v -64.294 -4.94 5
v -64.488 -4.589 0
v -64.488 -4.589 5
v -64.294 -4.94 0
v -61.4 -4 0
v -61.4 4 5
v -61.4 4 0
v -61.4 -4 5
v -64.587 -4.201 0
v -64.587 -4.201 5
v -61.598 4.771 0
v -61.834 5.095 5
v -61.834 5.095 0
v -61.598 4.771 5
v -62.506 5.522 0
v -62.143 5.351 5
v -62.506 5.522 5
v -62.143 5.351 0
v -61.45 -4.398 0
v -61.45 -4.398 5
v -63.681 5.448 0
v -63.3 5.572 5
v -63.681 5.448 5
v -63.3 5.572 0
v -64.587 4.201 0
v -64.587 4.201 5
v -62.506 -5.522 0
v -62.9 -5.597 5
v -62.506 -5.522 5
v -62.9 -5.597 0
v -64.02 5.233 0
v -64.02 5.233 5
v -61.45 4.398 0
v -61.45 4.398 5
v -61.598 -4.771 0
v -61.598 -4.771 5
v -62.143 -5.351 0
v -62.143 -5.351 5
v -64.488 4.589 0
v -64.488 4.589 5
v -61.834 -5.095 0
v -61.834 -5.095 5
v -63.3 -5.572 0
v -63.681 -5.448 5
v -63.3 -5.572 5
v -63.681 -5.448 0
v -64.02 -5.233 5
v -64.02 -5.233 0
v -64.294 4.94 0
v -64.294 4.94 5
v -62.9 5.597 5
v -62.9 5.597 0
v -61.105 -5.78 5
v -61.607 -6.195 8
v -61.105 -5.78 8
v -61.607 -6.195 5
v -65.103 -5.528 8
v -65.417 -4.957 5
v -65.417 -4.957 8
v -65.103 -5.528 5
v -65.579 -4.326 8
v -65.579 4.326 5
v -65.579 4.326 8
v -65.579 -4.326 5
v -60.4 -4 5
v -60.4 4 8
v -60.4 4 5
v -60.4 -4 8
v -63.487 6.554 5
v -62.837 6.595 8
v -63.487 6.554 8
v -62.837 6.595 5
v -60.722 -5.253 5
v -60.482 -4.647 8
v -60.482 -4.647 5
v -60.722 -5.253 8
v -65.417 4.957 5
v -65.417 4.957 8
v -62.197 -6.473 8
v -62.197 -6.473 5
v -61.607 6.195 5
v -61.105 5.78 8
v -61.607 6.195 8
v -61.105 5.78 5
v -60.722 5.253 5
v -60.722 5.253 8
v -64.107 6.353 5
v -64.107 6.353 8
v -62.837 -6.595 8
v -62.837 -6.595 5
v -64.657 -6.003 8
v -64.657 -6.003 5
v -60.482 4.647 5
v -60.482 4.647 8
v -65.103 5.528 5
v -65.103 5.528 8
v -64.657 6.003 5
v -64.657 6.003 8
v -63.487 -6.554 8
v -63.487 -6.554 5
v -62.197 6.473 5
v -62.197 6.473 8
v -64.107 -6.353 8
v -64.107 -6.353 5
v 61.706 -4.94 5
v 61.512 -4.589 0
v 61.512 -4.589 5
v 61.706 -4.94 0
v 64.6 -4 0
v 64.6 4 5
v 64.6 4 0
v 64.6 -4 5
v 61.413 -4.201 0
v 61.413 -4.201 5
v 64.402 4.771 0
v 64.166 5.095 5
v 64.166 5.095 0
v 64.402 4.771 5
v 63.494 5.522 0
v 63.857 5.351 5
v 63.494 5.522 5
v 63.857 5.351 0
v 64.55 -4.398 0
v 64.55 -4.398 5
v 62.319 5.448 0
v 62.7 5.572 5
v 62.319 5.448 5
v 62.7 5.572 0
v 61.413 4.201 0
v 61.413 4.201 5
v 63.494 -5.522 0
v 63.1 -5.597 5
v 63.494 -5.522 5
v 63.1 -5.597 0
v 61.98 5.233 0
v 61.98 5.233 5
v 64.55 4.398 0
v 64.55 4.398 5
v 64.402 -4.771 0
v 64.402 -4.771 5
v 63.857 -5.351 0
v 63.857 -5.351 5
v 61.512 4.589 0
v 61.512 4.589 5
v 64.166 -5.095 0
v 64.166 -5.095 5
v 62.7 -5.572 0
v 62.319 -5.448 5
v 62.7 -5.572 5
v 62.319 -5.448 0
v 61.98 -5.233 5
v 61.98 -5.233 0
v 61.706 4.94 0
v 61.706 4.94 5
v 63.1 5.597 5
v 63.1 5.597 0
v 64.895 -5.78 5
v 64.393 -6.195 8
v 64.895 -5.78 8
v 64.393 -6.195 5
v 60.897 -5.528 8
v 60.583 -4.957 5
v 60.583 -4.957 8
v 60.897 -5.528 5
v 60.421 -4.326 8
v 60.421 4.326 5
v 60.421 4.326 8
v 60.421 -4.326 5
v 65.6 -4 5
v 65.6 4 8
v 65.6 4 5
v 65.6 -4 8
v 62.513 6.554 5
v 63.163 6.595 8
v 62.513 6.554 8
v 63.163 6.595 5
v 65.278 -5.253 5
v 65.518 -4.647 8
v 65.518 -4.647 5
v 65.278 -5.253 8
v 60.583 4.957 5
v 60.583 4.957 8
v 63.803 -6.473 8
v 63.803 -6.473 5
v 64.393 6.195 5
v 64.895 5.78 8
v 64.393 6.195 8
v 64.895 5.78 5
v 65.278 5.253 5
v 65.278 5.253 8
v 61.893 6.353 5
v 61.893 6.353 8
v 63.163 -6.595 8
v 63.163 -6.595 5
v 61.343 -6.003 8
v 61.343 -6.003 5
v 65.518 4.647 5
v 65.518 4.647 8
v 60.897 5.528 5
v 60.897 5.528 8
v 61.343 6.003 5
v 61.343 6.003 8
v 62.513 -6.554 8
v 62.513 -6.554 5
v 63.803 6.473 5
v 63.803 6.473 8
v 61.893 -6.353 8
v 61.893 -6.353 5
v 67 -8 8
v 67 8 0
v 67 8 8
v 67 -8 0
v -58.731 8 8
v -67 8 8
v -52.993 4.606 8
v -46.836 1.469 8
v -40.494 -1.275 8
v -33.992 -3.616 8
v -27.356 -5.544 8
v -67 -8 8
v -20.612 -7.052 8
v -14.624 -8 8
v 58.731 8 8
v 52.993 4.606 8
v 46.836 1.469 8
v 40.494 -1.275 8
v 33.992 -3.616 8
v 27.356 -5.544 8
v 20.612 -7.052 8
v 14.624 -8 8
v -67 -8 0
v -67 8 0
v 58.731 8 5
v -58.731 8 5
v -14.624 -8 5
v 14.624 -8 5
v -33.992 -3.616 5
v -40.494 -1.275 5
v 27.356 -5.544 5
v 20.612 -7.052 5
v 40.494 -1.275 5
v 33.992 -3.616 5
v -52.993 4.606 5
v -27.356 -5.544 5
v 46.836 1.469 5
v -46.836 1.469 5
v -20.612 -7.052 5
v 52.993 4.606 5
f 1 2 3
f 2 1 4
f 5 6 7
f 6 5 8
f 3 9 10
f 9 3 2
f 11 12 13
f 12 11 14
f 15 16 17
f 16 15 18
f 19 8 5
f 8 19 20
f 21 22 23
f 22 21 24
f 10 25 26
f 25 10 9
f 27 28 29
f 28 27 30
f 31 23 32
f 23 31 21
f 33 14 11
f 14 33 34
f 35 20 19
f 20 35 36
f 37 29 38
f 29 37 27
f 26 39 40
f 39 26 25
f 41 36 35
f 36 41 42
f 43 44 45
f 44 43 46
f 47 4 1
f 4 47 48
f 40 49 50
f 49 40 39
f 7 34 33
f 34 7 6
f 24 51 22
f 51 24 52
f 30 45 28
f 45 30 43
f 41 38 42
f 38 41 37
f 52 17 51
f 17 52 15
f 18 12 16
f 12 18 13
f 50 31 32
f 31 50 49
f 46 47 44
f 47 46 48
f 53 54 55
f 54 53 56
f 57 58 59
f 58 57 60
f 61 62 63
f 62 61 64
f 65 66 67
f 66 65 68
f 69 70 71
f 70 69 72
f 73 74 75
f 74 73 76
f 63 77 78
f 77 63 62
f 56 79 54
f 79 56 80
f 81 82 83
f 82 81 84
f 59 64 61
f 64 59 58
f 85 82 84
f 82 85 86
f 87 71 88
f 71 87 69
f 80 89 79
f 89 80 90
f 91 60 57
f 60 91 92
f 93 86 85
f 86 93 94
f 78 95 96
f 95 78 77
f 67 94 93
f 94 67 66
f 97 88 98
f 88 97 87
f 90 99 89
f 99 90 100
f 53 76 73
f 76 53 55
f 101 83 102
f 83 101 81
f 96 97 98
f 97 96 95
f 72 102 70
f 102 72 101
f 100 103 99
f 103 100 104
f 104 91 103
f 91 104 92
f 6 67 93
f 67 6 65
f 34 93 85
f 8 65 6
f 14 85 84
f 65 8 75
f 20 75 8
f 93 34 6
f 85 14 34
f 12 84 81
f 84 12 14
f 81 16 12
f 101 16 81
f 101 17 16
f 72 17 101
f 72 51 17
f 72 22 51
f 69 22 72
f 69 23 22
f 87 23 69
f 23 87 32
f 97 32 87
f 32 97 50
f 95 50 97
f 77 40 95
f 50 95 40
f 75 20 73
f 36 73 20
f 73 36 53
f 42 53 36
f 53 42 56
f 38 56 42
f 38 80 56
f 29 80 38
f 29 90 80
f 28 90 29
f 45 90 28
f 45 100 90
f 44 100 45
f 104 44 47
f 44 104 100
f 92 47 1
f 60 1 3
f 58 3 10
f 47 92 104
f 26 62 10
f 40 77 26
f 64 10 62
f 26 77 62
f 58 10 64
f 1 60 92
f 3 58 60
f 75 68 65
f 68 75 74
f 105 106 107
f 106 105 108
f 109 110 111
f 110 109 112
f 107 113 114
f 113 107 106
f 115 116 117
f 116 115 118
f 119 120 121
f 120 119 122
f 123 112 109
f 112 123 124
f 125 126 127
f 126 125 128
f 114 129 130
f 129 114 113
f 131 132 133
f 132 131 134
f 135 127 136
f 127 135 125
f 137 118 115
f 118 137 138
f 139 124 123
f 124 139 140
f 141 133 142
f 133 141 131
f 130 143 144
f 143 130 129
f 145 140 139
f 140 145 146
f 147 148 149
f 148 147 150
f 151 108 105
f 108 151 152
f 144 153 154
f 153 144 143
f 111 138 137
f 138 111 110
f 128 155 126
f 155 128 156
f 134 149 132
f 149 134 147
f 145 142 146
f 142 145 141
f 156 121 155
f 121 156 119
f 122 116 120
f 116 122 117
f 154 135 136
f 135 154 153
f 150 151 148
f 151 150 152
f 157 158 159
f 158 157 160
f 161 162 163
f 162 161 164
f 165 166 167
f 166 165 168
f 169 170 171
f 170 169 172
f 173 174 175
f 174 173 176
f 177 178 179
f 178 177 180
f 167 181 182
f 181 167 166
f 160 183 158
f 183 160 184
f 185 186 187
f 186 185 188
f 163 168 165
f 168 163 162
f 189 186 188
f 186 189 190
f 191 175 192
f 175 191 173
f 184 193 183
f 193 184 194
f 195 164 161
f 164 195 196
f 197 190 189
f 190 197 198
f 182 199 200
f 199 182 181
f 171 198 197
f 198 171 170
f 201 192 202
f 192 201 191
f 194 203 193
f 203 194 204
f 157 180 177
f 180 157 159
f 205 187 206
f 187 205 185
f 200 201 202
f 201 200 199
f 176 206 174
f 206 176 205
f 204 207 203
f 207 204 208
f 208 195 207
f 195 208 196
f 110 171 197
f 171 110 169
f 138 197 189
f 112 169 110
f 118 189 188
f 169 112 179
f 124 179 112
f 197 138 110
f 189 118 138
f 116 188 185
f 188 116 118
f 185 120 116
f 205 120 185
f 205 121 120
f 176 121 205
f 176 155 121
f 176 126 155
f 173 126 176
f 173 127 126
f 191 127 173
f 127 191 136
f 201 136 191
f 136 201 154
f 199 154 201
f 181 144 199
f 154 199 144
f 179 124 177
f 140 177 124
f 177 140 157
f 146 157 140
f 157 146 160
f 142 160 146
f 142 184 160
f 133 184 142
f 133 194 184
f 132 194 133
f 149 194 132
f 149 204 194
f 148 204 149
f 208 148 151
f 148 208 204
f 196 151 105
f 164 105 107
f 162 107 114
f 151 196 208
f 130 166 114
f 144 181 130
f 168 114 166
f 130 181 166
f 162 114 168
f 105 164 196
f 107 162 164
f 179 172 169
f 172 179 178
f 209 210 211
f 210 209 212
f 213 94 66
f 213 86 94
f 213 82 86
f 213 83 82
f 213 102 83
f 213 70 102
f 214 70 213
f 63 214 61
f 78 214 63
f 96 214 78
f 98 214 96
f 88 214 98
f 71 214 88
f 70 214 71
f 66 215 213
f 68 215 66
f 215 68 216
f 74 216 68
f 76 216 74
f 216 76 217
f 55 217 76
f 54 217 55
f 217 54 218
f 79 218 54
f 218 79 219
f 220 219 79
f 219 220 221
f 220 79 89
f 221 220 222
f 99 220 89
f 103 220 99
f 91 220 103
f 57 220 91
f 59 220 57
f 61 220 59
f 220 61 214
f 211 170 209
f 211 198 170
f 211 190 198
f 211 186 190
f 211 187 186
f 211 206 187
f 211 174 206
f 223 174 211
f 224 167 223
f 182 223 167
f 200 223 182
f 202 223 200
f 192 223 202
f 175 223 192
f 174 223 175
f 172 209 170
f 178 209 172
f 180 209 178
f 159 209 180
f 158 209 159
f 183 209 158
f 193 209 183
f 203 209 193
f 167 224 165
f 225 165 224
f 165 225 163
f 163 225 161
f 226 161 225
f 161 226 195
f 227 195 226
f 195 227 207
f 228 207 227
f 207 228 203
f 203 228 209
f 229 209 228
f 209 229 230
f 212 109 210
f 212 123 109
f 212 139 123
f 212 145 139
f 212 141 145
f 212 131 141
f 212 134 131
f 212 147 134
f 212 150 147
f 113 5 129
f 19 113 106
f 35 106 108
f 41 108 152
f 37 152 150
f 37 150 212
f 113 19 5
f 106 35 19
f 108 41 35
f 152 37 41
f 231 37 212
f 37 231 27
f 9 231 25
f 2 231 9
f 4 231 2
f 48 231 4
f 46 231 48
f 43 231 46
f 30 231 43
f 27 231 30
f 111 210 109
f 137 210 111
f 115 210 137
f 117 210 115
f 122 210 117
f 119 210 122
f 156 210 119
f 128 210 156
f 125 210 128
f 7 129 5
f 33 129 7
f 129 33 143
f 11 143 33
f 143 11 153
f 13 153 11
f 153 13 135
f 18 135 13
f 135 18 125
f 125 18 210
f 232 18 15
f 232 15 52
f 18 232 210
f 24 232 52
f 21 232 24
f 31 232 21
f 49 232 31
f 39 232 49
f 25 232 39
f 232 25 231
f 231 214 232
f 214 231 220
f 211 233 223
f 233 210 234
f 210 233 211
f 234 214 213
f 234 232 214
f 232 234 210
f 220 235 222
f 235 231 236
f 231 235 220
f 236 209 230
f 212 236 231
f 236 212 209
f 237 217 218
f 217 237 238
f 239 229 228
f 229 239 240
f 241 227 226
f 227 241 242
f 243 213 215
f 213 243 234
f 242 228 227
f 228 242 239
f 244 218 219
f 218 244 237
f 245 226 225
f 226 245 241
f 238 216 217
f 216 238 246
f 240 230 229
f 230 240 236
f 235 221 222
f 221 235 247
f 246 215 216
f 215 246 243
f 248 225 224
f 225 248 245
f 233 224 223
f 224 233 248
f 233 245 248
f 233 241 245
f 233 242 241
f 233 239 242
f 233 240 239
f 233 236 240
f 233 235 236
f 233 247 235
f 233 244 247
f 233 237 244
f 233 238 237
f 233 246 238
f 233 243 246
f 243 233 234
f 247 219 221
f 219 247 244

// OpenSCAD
BED_HEIGHT = 3;
BED_DIAMETER = 220;
OVERHANG = 1;

WIDTH = 16;
LENGTH = 134;
HEIGHT = 5 + BED_HEIGHT;

BOLT_DIAMETER = 3.2;
BOLT_HEAD_DIAMETER = 5.2;
BOLT_SHAFT_LENGTH = 5;
SLOT_LENGTH = 8;
BOLT_OFFSET = 4;

difference() {
    translate([-LENGTH/2, -WIDTH/2, 0])
    cube(
        size = [LENGTH, WIDTH, HEIGHT]
    );

    translate([
        0,
        BED_DIAMETER/2 - WIDTH/2 - OVERHANG,
        HEIGHT - BED_HEIGHT
    ])
    cylinder(
        r = BED_DIAMETER/2,
        h = 2*BED_HEIGHT,
        $fn = 100
    );

    translate([
        -LENGTH/2 + BOLT_OFFSET,
        0,
        -1
    ])
    BoltSlot(
        BOLT_DIAMETER,
        BOLT_SHAFT_LENGTH + 1,
        BOLT_HEAD_DIAMETER,
        HEIGHT - BOLT_SHAFT_LENGTH + 2,
        SLOT_LENGTH
    );

    translate([
        LENGTH/2 - BOLT_OFFSET,
        0,
        -1
    ])
    BoltSlot(
        BOLT_DIAMETER,
        BOLT_SHAFT_LENGTH + 1,
        BOLT_HEAD_DIAMETER,
        HEIGHT - BOLT_SHAFT_LENGTH + 2,
        SLOT_LENGTH
    );
}

module Slot(
    diameter,
    height,
    width
) {
    linear_extrude(height = height)
    hull() {
        translate([0, -width/2, 0])
        circle(
            r = diameter/2,
            $fn = 25
        );

        translate([0, width/2, 0])
        circle(
            r = diameter/2,
            $fn = 25
        );
    }

}

module BoltSlot(
    shaftDiameter,
    shaftLength,
    headDiameter,
    headLength,
    slotWidth
) {
    union() {
        Slot(
            shaftDiameter,
            shaftLength + headLength,
            slotWidth
        );

        translate([0, 0, shaftLength])
        Slot(
            headDiameter,
            headLength,
            slotWidth
        );
    }
}
